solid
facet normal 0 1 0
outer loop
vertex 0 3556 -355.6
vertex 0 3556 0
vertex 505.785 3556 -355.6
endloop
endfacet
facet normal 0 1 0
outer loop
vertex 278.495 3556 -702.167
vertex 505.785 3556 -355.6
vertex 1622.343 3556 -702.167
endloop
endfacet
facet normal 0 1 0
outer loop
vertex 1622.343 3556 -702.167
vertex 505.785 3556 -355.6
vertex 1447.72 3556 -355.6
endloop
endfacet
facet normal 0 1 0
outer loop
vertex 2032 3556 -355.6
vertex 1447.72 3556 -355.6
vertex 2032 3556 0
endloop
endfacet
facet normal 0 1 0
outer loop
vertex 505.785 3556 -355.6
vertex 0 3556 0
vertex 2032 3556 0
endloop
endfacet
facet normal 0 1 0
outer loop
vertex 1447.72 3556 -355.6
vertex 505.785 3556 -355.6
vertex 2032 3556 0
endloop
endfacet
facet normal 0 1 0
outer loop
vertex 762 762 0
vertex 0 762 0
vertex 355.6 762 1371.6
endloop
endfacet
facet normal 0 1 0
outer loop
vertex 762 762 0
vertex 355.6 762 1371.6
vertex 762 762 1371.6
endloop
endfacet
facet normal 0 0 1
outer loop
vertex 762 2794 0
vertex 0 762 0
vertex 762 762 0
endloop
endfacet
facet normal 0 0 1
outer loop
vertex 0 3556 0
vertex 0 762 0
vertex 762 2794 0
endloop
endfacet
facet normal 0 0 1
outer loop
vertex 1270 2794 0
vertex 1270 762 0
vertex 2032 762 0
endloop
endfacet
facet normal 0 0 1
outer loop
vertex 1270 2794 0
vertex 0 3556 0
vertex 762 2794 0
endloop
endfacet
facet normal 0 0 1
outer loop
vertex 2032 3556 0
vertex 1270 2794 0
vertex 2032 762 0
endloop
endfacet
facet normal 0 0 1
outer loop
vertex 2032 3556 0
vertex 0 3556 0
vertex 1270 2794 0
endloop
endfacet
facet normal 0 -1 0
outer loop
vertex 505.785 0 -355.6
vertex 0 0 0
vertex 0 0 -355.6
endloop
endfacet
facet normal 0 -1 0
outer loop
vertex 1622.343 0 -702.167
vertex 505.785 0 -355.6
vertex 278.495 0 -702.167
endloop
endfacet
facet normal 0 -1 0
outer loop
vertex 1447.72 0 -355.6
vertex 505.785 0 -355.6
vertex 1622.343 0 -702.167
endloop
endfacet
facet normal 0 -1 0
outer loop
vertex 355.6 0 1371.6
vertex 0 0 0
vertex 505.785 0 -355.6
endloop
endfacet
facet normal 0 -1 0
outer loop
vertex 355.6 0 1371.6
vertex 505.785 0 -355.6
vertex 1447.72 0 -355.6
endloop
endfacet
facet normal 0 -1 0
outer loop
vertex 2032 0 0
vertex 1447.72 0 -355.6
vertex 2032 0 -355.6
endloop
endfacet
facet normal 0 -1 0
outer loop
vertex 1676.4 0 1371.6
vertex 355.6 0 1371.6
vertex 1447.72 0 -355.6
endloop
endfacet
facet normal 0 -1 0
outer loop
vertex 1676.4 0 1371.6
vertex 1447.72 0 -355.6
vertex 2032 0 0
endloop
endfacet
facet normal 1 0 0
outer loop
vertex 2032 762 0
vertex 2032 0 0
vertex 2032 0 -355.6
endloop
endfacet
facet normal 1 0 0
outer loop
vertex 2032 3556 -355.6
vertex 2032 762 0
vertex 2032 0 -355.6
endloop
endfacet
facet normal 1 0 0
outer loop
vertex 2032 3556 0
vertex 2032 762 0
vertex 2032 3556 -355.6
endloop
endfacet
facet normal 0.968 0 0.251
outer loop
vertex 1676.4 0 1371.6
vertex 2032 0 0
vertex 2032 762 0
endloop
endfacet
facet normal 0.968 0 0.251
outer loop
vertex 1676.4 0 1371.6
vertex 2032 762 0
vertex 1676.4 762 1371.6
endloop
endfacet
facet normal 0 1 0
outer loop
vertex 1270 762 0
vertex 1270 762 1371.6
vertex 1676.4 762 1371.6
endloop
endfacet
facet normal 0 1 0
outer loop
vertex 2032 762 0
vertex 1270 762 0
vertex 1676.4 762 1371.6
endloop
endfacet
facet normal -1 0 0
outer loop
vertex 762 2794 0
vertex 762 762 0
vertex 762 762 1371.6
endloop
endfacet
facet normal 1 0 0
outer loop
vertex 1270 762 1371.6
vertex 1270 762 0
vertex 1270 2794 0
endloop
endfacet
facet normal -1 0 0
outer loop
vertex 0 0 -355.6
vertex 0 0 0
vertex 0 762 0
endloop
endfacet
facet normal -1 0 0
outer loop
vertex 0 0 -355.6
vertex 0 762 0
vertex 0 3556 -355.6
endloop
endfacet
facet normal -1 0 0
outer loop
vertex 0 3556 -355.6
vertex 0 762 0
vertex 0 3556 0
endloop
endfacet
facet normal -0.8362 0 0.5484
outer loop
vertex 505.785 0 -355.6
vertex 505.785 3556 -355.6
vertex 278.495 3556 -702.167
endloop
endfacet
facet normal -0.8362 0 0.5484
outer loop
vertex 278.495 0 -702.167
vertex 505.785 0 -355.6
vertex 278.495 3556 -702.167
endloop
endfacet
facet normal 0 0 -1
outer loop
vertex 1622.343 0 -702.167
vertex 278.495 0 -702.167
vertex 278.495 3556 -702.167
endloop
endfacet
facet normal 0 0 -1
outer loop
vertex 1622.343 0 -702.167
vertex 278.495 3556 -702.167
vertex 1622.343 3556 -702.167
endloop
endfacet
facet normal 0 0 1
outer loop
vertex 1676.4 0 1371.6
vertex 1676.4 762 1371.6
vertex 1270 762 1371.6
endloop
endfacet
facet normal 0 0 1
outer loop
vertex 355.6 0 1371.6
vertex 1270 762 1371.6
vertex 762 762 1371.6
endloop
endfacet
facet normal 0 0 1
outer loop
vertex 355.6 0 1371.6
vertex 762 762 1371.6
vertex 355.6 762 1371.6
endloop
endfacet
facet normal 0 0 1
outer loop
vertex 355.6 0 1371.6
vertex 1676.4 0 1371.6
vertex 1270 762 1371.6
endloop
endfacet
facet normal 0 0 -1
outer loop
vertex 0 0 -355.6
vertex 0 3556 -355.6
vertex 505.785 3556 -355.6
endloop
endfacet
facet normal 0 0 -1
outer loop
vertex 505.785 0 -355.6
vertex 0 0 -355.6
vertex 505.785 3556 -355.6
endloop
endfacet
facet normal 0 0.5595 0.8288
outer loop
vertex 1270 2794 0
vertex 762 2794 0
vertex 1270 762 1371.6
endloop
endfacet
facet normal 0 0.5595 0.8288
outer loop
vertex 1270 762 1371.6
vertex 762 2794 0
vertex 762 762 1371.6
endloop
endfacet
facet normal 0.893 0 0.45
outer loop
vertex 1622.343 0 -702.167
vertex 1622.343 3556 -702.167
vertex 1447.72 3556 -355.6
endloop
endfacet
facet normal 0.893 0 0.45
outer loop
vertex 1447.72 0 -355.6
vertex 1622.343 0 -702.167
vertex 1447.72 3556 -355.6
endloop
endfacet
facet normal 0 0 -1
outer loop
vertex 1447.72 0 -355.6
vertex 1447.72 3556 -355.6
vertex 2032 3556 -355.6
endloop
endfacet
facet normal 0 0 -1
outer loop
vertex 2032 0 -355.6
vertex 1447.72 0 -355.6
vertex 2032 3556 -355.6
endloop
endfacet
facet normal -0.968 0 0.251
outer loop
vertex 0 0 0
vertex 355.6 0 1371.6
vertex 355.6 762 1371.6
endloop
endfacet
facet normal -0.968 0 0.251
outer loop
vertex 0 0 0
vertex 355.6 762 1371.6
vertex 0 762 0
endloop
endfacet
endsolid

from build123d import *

# Parameters (mm, degrees)
F0_W     = 2032
F0_H     = 3556
F1_DEPTH = 355.6
F3_DEPTH = 3556
F5_DEPTH = 762
F6_W     = 508
F6_H     = 2032
F7_DEPTH = 1371.6
F9_DEPTH = 1270.001


with BuildPart() as f1:
    # F0 (on Top) → F1 (new body)
    with BuildSketch(Plane.XY):
        with Locations((1016, 1778)):
            Rectangle(F0_W, F0_H)
    extrude(amount=-F1_DEPTH)

    # F2 (on face) → F3 (join)
    with BuildSketch(Plane.XZ):
        Polygon((505.785346, -355.6), (278.495428, -702.167366), (1622.342771, -702.167366), (1447.72017, -355.6), align=None)
    extrude(amount=-F3_DEPTH)

    # F4 (on face) → F5 (join)
    with BuildSketch(Plane.XZ):
        Polygon((355.6, 1371.6), (0, 0), (2032, 0), (1676.4, 1371.6), align=None)
    extrude(amount=-F5_DEPTH)

    # F6 (on face) → F7 (join)
    with BuildSketch(Plane.XY):
        with Locations((1016, 1778)):
            Rectangle(F6_W, F6_H)
    extrude(amount=F7_DEPTH)

    # F8 (on face) → F9 (cut, through all)
    with BuildSketch(Plane(origin=(762, 0, 0), x_dir=(0, -1, 0), z_dir=(-1, 0, 0))):
        Polygon((-2794, 0), (-762, 1371.6), (-2794, 1371.6), align=None)
    extrude(amount=-F9_DEPTH, mode=Mode.SUBTRACT)


solid = f1.part
